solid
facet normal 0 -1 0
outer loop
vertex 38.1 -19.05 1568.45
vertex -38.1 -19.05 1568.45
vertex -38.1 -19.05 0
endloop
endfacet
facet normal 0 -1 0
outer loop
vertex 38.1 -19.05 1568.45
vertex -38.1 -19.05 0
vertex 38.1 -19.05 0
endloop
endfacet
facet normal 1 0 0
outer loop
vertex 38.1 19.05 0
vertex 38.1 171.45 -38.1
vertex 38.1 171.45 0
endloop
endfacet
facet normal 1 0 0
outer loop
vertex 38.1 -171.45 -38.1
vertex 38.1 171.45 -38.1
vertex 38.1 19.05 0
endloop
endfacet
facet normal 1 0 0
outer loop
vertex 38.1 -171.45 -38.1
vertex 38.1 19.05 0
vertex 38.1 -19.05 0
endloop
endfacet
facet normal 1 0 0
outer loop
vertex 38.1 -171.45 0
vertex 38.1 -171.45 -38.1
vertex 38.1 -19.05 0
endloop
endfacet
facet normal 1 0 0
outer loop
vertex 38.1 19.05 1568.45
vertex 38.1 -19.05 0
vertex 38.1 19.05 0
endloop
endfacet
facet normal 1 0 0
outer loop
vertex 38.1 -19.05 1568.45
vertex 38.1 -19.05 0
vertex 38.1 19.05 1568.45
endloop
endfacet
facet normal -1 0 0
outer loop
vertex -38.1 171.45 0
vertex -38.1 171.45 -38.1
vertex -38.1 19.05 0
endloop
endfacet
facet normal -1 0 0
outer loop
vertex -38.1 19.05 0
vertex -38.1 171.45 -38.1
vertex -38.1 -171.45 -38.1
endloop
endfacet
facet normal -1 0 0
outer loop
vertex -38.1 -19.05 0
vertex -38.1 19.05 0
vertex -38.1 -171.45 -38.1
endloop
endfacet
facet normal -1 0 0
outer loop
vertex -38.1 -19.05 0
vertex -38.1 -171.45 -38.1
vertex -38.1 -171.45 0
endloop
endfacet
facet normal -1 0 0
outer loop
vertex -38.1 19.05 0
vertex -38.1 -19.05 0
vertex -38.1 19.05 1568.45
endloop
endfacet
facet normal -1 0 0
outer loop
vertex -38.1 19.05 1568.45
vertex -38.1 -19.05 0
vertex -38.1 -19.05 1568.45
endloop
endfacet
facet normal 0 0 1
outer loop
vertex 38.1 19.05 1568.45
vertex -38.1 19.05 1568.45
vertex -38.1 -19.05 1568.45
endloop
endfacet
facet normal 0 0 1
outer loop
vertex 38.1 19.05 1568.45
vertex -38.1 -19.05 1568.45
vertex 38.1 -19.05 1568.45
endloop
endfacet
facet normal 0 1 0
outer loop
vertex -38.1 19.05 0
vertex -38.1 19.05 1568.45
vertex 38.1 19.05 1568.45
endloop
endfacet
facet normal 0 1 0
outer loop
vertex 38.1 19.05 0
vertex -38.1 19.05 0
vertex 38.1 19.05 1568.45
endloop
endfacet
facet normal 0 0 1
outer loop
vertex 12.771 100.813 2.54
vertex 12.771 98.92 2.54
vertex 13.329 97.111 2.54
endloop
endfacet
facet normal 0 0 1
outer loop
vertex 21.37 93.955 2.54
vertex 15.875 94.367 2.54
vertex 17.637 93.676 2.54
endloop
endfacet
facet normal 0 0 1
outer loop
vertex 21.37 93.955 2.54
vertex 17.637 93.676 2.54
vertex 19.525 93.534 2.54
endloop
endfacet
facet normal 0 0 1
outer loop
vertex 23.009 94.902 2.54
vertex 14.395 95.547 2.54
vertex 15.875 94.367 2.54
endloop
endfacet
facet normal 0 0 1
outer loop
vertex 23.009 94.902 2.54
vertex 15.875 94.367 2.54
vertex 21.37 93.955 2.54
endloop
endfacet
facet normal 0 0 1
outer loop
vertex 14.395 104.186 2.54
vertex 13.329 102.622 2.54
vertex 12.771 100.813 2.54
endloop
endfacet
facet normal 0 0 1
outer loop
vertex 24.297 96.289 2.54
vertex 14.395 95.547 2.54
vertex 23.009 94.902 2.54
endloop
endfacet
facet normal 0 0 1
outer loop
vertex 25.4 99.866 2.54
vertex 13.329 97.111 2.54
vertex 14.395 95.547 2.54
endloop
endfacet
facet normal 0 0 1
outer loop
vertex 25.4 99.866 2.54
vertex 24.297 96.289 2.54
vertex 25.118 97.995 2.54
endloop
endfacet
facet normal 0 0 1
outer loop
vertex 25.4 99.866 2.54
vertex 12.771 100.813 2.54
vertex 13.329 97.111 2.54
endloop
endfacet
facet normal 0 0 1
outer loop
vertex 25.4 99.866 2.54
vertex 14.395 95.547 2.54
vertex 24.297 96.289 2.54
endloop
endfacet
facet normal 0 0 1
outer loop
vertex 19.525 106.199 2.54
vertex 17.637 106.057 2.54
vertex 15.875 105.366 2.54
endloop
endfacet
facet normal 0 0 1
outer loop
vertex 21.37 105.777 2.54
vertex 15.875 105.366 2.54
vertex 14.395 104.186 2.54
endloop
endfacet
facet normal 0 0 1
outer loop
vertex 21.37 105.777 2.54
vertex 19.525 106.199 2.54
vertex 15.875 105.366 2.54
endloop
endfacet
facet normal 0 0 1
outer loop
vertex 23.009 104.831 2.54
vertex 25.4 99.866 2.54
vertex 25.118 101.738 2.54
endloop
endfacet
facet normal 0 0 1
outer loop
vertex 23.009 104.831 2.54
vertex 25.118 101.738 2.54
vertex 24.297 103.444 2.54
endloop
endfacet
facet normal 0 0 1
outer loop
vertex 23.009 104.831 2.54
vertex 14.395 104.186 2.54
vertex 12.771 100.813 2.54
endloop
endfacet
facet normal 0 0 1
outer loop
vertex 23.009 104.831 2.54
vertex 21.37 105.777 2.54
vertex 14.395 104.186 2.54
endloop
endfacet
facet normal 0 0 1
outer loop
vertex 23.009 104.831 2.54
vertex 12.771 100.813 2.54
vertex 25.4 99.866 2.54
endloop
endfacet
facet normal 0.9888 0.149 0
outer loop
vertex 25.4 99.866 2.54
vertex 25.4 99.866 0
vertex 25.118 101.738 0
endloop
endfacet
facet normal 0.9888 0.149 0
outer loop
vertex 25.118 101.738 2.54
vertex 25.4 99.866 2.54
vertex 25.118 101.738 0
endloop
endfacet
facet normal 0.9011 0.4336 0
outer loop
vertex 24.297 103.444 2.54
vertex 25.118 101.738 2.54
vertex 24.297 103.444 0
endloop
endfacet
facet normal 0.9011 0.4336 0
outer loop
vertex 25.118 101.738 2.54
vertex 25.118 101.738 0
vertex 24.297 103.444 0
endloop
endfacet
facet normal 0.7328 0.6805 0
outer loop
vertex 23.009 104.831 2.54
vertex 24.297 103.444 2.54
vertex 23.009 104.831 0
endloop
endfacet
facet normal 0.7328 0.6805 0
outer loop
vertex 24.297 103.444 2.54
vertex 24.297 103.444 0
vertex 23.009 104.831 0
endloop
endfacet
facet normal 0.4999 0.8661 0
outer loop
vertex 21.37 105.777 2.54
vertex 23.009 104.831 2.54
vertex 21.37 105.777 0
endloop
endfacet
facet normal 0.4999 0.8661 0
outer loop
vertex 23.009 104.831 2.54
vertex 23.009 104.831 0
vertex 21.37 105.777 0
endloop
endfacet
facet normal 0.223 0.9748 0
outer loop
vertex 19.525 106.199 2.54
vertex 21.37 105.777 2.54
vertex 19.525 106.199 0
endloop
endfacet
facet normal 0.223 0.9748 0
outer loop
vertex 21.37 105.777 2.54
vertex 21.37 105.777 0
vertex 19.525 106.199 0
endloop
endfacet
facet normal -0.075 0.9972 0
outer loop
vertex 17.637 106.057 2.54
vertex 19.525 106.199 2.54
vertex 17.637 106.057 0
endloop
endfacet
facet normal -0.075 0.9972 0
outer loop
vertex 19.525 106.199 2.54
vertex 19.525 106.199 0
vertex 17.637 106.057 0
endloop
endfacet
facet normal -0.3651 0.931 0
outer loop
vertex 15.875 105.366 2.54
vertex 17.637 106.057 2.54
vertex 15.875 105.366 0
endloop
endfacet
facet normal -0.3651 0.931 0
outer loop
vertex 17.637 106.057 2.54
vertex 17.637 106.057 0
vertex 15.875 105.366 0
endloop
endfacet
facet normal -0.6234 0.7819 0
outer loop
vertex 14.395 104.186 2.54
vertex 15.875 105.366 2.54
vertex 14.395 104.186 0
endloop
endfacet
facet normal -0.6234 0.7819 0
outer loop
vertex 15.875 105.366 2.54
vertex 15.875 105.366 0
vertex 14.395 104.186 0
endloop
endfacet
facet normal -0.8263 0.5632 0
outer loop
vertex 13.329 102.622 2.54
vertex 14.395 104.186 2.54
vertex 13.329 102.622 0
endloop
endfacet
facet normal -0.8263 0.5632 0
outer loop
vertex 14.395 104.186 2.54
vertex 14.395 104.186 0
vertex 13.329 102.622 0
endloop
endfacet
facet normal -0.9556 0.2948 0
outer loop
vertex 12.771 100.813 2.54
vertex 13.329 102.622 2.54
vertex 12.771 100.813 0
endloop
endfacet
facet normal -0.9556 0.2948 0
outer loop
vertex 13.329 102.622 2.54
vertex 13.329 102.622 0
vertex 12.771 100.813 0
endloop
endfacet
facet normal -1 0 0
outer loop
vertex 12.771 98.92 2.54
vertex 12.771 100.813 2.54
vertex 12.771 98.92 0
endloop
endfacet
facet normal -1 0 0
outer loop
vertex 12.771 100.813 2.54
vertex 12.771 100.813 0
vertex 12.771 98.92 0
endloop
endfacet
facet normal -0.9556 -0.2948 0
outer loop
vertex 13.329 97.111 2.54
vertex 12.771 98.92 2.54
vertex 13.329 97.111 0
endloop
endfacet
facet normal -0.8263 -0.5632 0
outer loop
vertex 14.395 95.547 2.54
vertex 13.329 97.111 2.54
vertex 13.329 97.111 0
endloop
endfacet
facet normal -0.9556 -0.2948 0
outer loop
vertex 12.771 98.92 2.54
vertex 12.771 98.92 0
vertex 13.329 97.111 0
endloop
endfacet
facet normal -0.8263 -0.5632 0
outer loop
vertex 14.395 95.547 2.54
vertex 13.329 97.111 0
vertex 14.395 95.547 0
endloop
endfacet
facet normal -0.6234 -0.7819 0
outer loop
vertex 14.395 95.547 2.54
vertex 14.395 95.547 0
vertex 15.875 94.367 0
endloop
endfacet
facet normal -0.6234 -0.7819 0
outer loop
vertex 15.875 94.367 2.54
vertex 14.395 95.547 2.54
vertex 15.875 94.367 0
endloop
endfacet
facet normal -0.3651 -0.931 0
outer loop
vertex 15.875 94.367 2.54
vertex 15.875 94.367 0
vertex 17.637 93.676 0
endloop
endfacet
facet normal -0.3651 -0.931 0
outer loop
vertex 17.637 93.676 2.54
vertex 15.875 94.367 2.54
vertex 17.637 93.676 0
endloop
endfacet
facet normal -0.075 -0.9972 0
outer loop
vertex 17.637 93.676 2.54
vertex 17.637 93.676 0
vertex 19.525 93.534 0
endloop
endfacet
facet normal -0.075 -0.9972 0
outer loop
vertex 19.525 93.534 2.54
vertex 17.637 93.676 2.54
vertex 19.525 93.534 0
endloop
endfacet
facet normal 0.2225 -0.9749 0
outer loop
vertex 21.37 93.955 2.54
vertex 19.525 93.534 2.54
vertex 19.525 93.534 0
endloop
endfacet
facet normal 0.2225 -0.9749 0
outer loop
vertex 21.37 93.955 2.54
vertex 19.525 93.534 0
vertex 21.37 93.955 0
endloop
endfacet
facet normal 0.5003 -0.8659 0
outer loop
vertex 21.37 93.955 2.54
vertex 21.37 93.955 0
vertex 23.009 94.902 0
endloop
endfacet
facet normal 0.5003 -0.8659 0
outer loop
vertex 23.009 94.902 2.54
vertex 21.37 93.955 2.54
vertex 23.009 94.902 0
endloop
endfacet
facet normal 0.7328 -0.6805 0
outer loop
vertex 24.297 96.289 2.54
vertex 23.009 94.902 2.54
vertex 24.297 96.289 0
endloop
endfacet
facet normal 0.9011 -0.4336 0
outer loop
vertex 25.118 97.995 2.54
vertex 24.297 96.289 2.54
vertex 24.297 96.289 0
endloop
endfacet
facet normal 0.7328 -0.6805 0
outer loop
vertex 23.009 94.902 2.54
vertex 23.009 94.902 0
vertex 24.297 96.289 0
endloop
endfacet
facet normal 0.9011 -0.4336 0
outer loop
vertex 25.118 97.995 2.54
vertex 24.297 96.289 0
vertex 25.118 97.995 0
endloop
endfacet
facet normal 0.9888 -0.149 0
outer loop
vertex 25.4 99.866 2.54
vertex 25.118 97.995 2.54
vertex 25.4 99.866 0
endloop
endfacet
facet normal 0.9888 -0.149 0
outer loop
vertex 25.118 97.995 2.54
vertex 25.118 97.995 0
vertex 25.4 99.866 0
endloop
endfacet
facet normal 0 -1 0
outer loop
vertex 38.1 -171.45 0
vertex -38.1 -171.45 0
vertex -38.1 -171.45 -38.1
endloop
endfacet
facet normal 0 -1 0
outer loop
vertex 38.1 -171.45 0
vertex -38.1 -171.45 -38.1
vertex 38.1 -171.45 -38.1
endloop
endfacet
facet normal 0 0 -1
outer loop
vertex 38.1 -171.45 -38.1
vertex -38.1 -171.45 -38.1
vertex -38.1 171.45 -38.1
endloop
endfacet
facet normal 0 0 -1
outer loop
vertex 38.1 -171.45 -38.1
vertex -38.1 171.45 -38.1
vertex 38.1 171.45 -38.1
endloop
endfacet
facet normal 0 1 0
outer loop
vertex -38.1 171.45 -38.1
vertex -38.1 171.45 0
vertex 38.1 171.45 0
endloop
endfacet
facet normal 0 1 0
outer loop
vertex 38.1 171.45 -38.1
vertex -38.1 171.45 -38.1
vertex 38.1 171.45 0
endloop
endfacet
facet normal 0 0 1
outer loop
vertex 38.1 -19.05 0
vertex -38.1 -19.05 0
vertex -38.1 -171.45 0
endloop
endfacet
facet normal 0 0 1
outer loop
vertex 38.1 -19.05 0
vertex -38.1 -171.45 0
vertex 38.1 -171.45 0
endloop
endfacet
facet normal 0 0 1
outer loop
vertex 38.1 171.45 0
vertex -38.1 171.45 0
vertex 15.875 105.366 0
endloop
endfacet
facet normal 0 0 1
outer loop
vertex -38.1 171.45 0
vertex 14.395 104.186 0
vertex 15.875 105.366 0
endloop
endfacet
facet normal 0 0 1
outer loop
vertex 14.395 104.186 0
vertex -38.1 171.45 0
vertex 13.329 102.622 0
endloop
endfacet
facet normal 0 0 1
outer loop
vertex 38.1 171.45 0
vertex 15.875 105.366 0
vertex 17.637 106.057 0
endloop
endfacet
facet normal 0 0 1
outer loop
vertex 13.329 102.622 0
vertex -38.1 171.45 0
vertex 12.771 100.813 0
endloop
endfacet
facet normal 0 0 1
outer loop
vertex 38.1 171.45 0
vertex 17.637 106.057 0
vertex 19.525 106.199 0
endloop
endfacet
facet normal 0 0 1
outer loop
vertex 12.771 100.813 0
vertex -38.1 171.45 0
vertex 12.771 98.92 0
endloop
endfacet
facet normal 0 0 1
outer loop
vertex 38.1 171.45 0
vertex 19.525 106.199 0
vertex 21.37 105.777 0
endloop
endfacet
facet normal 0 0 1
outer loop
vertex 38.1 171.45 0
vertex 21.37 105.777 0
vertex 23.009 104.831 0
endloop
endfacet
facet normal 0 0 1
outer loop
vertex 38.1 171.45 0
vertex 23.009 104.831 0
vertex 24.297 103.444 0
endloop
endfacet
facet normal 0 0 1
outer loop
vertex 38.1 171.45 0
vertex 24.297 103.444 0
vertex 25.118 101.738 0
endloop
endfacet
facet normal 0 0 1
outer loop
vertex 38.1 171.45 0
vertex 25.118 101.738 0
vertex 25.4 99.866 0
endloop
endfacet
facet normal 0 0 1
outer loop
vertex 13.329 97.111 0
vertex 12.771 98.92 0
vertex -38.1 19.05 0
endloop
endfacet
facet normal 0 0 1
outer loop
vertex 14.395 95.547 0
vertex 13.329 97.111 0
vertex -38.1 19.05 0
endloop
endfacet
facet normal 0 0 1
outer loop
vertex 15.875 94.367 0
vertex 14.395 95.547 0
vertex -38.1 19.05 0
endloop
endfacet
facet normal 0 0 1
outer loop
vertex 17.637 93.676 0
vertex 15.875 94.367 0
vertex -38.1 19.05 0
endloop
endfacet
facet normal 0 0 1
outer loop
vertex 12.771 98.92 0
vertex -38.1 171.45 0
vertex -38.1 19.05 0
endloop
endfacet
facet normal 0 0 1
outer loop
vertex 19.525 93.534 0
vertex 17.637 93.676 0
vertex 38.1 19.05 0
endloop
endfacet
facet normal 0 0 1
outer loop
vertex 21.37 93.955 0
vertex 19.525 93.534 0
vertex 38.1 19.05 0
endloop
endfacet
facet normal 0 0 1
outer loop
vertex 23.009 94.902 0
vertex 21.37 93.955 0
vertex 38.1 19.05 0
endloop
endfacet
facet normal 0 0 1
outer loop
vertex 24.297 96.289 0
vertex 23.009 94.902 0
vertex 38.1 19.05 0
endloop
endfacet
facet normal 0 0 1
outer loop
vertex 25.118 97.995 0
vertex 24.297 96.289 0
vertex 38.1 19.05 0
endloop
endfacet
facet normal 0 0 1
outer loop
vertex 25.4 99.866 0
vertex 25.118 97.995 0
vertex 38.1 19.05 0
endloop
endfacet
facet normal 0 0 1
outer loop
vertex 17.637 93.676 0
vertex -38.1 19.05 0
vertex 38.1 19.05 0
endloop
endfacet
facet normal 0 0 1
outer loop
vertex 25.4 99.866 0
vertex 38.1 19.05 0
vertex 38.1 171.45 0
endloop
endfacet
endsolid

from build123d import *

# Parameters (mm, degrees)
F0_W          = 76.2
F0_H          = 38.1
F1_DEPTH      = 1568.45
F2_W          = 76.2
F2_H          = 38.1
F3_DEPTH      = 38.1
F4_W          = 76.2
F4_H          = 38.1
F5_DEPTH      = 152.4
F5_DEPTH_BACK = 190.5
F6_R          = 6.35
F7_DEPTH      = 2.54


with BuildPart() as f1:
    # F0 (on Top) → F1 (new body)
    with BuildSketch(Plane.XY):
        Rectangle(F0_W, F0_H)
    extrude(amount=F1_DEPTH)

    # F2 (on face) → F3 (join)
    with BuildSketch(Plane(origin=(0, 0, 0), x_dir=(1, 0, 0), z_dir=(0, 0, -1))):
        Rectangle(F2_W, F2_H)
    extrude(amount=F3_DEPTH)

    # F4 (on face) → F5 (join, two sides)
    with BuildSketch(Plane.XZ.offset(19.05)) as f5_sk:
        with Locations((0, -19.05)):
            Rectangle(F4_W, F4_H)
    extrude(amount=F5_DEPTH)
    extrude(f5_sk.sketch, amount=-F5_DEPTH_BACK)

    # F6 (on face) → F7 (join)
    with BuildSketch(Plane.XY):
        with Locations((19.05, 99.86645)):
            Circle(F6_R)
    extrude(amount=F7_DEPTH)


solid = f1.part
